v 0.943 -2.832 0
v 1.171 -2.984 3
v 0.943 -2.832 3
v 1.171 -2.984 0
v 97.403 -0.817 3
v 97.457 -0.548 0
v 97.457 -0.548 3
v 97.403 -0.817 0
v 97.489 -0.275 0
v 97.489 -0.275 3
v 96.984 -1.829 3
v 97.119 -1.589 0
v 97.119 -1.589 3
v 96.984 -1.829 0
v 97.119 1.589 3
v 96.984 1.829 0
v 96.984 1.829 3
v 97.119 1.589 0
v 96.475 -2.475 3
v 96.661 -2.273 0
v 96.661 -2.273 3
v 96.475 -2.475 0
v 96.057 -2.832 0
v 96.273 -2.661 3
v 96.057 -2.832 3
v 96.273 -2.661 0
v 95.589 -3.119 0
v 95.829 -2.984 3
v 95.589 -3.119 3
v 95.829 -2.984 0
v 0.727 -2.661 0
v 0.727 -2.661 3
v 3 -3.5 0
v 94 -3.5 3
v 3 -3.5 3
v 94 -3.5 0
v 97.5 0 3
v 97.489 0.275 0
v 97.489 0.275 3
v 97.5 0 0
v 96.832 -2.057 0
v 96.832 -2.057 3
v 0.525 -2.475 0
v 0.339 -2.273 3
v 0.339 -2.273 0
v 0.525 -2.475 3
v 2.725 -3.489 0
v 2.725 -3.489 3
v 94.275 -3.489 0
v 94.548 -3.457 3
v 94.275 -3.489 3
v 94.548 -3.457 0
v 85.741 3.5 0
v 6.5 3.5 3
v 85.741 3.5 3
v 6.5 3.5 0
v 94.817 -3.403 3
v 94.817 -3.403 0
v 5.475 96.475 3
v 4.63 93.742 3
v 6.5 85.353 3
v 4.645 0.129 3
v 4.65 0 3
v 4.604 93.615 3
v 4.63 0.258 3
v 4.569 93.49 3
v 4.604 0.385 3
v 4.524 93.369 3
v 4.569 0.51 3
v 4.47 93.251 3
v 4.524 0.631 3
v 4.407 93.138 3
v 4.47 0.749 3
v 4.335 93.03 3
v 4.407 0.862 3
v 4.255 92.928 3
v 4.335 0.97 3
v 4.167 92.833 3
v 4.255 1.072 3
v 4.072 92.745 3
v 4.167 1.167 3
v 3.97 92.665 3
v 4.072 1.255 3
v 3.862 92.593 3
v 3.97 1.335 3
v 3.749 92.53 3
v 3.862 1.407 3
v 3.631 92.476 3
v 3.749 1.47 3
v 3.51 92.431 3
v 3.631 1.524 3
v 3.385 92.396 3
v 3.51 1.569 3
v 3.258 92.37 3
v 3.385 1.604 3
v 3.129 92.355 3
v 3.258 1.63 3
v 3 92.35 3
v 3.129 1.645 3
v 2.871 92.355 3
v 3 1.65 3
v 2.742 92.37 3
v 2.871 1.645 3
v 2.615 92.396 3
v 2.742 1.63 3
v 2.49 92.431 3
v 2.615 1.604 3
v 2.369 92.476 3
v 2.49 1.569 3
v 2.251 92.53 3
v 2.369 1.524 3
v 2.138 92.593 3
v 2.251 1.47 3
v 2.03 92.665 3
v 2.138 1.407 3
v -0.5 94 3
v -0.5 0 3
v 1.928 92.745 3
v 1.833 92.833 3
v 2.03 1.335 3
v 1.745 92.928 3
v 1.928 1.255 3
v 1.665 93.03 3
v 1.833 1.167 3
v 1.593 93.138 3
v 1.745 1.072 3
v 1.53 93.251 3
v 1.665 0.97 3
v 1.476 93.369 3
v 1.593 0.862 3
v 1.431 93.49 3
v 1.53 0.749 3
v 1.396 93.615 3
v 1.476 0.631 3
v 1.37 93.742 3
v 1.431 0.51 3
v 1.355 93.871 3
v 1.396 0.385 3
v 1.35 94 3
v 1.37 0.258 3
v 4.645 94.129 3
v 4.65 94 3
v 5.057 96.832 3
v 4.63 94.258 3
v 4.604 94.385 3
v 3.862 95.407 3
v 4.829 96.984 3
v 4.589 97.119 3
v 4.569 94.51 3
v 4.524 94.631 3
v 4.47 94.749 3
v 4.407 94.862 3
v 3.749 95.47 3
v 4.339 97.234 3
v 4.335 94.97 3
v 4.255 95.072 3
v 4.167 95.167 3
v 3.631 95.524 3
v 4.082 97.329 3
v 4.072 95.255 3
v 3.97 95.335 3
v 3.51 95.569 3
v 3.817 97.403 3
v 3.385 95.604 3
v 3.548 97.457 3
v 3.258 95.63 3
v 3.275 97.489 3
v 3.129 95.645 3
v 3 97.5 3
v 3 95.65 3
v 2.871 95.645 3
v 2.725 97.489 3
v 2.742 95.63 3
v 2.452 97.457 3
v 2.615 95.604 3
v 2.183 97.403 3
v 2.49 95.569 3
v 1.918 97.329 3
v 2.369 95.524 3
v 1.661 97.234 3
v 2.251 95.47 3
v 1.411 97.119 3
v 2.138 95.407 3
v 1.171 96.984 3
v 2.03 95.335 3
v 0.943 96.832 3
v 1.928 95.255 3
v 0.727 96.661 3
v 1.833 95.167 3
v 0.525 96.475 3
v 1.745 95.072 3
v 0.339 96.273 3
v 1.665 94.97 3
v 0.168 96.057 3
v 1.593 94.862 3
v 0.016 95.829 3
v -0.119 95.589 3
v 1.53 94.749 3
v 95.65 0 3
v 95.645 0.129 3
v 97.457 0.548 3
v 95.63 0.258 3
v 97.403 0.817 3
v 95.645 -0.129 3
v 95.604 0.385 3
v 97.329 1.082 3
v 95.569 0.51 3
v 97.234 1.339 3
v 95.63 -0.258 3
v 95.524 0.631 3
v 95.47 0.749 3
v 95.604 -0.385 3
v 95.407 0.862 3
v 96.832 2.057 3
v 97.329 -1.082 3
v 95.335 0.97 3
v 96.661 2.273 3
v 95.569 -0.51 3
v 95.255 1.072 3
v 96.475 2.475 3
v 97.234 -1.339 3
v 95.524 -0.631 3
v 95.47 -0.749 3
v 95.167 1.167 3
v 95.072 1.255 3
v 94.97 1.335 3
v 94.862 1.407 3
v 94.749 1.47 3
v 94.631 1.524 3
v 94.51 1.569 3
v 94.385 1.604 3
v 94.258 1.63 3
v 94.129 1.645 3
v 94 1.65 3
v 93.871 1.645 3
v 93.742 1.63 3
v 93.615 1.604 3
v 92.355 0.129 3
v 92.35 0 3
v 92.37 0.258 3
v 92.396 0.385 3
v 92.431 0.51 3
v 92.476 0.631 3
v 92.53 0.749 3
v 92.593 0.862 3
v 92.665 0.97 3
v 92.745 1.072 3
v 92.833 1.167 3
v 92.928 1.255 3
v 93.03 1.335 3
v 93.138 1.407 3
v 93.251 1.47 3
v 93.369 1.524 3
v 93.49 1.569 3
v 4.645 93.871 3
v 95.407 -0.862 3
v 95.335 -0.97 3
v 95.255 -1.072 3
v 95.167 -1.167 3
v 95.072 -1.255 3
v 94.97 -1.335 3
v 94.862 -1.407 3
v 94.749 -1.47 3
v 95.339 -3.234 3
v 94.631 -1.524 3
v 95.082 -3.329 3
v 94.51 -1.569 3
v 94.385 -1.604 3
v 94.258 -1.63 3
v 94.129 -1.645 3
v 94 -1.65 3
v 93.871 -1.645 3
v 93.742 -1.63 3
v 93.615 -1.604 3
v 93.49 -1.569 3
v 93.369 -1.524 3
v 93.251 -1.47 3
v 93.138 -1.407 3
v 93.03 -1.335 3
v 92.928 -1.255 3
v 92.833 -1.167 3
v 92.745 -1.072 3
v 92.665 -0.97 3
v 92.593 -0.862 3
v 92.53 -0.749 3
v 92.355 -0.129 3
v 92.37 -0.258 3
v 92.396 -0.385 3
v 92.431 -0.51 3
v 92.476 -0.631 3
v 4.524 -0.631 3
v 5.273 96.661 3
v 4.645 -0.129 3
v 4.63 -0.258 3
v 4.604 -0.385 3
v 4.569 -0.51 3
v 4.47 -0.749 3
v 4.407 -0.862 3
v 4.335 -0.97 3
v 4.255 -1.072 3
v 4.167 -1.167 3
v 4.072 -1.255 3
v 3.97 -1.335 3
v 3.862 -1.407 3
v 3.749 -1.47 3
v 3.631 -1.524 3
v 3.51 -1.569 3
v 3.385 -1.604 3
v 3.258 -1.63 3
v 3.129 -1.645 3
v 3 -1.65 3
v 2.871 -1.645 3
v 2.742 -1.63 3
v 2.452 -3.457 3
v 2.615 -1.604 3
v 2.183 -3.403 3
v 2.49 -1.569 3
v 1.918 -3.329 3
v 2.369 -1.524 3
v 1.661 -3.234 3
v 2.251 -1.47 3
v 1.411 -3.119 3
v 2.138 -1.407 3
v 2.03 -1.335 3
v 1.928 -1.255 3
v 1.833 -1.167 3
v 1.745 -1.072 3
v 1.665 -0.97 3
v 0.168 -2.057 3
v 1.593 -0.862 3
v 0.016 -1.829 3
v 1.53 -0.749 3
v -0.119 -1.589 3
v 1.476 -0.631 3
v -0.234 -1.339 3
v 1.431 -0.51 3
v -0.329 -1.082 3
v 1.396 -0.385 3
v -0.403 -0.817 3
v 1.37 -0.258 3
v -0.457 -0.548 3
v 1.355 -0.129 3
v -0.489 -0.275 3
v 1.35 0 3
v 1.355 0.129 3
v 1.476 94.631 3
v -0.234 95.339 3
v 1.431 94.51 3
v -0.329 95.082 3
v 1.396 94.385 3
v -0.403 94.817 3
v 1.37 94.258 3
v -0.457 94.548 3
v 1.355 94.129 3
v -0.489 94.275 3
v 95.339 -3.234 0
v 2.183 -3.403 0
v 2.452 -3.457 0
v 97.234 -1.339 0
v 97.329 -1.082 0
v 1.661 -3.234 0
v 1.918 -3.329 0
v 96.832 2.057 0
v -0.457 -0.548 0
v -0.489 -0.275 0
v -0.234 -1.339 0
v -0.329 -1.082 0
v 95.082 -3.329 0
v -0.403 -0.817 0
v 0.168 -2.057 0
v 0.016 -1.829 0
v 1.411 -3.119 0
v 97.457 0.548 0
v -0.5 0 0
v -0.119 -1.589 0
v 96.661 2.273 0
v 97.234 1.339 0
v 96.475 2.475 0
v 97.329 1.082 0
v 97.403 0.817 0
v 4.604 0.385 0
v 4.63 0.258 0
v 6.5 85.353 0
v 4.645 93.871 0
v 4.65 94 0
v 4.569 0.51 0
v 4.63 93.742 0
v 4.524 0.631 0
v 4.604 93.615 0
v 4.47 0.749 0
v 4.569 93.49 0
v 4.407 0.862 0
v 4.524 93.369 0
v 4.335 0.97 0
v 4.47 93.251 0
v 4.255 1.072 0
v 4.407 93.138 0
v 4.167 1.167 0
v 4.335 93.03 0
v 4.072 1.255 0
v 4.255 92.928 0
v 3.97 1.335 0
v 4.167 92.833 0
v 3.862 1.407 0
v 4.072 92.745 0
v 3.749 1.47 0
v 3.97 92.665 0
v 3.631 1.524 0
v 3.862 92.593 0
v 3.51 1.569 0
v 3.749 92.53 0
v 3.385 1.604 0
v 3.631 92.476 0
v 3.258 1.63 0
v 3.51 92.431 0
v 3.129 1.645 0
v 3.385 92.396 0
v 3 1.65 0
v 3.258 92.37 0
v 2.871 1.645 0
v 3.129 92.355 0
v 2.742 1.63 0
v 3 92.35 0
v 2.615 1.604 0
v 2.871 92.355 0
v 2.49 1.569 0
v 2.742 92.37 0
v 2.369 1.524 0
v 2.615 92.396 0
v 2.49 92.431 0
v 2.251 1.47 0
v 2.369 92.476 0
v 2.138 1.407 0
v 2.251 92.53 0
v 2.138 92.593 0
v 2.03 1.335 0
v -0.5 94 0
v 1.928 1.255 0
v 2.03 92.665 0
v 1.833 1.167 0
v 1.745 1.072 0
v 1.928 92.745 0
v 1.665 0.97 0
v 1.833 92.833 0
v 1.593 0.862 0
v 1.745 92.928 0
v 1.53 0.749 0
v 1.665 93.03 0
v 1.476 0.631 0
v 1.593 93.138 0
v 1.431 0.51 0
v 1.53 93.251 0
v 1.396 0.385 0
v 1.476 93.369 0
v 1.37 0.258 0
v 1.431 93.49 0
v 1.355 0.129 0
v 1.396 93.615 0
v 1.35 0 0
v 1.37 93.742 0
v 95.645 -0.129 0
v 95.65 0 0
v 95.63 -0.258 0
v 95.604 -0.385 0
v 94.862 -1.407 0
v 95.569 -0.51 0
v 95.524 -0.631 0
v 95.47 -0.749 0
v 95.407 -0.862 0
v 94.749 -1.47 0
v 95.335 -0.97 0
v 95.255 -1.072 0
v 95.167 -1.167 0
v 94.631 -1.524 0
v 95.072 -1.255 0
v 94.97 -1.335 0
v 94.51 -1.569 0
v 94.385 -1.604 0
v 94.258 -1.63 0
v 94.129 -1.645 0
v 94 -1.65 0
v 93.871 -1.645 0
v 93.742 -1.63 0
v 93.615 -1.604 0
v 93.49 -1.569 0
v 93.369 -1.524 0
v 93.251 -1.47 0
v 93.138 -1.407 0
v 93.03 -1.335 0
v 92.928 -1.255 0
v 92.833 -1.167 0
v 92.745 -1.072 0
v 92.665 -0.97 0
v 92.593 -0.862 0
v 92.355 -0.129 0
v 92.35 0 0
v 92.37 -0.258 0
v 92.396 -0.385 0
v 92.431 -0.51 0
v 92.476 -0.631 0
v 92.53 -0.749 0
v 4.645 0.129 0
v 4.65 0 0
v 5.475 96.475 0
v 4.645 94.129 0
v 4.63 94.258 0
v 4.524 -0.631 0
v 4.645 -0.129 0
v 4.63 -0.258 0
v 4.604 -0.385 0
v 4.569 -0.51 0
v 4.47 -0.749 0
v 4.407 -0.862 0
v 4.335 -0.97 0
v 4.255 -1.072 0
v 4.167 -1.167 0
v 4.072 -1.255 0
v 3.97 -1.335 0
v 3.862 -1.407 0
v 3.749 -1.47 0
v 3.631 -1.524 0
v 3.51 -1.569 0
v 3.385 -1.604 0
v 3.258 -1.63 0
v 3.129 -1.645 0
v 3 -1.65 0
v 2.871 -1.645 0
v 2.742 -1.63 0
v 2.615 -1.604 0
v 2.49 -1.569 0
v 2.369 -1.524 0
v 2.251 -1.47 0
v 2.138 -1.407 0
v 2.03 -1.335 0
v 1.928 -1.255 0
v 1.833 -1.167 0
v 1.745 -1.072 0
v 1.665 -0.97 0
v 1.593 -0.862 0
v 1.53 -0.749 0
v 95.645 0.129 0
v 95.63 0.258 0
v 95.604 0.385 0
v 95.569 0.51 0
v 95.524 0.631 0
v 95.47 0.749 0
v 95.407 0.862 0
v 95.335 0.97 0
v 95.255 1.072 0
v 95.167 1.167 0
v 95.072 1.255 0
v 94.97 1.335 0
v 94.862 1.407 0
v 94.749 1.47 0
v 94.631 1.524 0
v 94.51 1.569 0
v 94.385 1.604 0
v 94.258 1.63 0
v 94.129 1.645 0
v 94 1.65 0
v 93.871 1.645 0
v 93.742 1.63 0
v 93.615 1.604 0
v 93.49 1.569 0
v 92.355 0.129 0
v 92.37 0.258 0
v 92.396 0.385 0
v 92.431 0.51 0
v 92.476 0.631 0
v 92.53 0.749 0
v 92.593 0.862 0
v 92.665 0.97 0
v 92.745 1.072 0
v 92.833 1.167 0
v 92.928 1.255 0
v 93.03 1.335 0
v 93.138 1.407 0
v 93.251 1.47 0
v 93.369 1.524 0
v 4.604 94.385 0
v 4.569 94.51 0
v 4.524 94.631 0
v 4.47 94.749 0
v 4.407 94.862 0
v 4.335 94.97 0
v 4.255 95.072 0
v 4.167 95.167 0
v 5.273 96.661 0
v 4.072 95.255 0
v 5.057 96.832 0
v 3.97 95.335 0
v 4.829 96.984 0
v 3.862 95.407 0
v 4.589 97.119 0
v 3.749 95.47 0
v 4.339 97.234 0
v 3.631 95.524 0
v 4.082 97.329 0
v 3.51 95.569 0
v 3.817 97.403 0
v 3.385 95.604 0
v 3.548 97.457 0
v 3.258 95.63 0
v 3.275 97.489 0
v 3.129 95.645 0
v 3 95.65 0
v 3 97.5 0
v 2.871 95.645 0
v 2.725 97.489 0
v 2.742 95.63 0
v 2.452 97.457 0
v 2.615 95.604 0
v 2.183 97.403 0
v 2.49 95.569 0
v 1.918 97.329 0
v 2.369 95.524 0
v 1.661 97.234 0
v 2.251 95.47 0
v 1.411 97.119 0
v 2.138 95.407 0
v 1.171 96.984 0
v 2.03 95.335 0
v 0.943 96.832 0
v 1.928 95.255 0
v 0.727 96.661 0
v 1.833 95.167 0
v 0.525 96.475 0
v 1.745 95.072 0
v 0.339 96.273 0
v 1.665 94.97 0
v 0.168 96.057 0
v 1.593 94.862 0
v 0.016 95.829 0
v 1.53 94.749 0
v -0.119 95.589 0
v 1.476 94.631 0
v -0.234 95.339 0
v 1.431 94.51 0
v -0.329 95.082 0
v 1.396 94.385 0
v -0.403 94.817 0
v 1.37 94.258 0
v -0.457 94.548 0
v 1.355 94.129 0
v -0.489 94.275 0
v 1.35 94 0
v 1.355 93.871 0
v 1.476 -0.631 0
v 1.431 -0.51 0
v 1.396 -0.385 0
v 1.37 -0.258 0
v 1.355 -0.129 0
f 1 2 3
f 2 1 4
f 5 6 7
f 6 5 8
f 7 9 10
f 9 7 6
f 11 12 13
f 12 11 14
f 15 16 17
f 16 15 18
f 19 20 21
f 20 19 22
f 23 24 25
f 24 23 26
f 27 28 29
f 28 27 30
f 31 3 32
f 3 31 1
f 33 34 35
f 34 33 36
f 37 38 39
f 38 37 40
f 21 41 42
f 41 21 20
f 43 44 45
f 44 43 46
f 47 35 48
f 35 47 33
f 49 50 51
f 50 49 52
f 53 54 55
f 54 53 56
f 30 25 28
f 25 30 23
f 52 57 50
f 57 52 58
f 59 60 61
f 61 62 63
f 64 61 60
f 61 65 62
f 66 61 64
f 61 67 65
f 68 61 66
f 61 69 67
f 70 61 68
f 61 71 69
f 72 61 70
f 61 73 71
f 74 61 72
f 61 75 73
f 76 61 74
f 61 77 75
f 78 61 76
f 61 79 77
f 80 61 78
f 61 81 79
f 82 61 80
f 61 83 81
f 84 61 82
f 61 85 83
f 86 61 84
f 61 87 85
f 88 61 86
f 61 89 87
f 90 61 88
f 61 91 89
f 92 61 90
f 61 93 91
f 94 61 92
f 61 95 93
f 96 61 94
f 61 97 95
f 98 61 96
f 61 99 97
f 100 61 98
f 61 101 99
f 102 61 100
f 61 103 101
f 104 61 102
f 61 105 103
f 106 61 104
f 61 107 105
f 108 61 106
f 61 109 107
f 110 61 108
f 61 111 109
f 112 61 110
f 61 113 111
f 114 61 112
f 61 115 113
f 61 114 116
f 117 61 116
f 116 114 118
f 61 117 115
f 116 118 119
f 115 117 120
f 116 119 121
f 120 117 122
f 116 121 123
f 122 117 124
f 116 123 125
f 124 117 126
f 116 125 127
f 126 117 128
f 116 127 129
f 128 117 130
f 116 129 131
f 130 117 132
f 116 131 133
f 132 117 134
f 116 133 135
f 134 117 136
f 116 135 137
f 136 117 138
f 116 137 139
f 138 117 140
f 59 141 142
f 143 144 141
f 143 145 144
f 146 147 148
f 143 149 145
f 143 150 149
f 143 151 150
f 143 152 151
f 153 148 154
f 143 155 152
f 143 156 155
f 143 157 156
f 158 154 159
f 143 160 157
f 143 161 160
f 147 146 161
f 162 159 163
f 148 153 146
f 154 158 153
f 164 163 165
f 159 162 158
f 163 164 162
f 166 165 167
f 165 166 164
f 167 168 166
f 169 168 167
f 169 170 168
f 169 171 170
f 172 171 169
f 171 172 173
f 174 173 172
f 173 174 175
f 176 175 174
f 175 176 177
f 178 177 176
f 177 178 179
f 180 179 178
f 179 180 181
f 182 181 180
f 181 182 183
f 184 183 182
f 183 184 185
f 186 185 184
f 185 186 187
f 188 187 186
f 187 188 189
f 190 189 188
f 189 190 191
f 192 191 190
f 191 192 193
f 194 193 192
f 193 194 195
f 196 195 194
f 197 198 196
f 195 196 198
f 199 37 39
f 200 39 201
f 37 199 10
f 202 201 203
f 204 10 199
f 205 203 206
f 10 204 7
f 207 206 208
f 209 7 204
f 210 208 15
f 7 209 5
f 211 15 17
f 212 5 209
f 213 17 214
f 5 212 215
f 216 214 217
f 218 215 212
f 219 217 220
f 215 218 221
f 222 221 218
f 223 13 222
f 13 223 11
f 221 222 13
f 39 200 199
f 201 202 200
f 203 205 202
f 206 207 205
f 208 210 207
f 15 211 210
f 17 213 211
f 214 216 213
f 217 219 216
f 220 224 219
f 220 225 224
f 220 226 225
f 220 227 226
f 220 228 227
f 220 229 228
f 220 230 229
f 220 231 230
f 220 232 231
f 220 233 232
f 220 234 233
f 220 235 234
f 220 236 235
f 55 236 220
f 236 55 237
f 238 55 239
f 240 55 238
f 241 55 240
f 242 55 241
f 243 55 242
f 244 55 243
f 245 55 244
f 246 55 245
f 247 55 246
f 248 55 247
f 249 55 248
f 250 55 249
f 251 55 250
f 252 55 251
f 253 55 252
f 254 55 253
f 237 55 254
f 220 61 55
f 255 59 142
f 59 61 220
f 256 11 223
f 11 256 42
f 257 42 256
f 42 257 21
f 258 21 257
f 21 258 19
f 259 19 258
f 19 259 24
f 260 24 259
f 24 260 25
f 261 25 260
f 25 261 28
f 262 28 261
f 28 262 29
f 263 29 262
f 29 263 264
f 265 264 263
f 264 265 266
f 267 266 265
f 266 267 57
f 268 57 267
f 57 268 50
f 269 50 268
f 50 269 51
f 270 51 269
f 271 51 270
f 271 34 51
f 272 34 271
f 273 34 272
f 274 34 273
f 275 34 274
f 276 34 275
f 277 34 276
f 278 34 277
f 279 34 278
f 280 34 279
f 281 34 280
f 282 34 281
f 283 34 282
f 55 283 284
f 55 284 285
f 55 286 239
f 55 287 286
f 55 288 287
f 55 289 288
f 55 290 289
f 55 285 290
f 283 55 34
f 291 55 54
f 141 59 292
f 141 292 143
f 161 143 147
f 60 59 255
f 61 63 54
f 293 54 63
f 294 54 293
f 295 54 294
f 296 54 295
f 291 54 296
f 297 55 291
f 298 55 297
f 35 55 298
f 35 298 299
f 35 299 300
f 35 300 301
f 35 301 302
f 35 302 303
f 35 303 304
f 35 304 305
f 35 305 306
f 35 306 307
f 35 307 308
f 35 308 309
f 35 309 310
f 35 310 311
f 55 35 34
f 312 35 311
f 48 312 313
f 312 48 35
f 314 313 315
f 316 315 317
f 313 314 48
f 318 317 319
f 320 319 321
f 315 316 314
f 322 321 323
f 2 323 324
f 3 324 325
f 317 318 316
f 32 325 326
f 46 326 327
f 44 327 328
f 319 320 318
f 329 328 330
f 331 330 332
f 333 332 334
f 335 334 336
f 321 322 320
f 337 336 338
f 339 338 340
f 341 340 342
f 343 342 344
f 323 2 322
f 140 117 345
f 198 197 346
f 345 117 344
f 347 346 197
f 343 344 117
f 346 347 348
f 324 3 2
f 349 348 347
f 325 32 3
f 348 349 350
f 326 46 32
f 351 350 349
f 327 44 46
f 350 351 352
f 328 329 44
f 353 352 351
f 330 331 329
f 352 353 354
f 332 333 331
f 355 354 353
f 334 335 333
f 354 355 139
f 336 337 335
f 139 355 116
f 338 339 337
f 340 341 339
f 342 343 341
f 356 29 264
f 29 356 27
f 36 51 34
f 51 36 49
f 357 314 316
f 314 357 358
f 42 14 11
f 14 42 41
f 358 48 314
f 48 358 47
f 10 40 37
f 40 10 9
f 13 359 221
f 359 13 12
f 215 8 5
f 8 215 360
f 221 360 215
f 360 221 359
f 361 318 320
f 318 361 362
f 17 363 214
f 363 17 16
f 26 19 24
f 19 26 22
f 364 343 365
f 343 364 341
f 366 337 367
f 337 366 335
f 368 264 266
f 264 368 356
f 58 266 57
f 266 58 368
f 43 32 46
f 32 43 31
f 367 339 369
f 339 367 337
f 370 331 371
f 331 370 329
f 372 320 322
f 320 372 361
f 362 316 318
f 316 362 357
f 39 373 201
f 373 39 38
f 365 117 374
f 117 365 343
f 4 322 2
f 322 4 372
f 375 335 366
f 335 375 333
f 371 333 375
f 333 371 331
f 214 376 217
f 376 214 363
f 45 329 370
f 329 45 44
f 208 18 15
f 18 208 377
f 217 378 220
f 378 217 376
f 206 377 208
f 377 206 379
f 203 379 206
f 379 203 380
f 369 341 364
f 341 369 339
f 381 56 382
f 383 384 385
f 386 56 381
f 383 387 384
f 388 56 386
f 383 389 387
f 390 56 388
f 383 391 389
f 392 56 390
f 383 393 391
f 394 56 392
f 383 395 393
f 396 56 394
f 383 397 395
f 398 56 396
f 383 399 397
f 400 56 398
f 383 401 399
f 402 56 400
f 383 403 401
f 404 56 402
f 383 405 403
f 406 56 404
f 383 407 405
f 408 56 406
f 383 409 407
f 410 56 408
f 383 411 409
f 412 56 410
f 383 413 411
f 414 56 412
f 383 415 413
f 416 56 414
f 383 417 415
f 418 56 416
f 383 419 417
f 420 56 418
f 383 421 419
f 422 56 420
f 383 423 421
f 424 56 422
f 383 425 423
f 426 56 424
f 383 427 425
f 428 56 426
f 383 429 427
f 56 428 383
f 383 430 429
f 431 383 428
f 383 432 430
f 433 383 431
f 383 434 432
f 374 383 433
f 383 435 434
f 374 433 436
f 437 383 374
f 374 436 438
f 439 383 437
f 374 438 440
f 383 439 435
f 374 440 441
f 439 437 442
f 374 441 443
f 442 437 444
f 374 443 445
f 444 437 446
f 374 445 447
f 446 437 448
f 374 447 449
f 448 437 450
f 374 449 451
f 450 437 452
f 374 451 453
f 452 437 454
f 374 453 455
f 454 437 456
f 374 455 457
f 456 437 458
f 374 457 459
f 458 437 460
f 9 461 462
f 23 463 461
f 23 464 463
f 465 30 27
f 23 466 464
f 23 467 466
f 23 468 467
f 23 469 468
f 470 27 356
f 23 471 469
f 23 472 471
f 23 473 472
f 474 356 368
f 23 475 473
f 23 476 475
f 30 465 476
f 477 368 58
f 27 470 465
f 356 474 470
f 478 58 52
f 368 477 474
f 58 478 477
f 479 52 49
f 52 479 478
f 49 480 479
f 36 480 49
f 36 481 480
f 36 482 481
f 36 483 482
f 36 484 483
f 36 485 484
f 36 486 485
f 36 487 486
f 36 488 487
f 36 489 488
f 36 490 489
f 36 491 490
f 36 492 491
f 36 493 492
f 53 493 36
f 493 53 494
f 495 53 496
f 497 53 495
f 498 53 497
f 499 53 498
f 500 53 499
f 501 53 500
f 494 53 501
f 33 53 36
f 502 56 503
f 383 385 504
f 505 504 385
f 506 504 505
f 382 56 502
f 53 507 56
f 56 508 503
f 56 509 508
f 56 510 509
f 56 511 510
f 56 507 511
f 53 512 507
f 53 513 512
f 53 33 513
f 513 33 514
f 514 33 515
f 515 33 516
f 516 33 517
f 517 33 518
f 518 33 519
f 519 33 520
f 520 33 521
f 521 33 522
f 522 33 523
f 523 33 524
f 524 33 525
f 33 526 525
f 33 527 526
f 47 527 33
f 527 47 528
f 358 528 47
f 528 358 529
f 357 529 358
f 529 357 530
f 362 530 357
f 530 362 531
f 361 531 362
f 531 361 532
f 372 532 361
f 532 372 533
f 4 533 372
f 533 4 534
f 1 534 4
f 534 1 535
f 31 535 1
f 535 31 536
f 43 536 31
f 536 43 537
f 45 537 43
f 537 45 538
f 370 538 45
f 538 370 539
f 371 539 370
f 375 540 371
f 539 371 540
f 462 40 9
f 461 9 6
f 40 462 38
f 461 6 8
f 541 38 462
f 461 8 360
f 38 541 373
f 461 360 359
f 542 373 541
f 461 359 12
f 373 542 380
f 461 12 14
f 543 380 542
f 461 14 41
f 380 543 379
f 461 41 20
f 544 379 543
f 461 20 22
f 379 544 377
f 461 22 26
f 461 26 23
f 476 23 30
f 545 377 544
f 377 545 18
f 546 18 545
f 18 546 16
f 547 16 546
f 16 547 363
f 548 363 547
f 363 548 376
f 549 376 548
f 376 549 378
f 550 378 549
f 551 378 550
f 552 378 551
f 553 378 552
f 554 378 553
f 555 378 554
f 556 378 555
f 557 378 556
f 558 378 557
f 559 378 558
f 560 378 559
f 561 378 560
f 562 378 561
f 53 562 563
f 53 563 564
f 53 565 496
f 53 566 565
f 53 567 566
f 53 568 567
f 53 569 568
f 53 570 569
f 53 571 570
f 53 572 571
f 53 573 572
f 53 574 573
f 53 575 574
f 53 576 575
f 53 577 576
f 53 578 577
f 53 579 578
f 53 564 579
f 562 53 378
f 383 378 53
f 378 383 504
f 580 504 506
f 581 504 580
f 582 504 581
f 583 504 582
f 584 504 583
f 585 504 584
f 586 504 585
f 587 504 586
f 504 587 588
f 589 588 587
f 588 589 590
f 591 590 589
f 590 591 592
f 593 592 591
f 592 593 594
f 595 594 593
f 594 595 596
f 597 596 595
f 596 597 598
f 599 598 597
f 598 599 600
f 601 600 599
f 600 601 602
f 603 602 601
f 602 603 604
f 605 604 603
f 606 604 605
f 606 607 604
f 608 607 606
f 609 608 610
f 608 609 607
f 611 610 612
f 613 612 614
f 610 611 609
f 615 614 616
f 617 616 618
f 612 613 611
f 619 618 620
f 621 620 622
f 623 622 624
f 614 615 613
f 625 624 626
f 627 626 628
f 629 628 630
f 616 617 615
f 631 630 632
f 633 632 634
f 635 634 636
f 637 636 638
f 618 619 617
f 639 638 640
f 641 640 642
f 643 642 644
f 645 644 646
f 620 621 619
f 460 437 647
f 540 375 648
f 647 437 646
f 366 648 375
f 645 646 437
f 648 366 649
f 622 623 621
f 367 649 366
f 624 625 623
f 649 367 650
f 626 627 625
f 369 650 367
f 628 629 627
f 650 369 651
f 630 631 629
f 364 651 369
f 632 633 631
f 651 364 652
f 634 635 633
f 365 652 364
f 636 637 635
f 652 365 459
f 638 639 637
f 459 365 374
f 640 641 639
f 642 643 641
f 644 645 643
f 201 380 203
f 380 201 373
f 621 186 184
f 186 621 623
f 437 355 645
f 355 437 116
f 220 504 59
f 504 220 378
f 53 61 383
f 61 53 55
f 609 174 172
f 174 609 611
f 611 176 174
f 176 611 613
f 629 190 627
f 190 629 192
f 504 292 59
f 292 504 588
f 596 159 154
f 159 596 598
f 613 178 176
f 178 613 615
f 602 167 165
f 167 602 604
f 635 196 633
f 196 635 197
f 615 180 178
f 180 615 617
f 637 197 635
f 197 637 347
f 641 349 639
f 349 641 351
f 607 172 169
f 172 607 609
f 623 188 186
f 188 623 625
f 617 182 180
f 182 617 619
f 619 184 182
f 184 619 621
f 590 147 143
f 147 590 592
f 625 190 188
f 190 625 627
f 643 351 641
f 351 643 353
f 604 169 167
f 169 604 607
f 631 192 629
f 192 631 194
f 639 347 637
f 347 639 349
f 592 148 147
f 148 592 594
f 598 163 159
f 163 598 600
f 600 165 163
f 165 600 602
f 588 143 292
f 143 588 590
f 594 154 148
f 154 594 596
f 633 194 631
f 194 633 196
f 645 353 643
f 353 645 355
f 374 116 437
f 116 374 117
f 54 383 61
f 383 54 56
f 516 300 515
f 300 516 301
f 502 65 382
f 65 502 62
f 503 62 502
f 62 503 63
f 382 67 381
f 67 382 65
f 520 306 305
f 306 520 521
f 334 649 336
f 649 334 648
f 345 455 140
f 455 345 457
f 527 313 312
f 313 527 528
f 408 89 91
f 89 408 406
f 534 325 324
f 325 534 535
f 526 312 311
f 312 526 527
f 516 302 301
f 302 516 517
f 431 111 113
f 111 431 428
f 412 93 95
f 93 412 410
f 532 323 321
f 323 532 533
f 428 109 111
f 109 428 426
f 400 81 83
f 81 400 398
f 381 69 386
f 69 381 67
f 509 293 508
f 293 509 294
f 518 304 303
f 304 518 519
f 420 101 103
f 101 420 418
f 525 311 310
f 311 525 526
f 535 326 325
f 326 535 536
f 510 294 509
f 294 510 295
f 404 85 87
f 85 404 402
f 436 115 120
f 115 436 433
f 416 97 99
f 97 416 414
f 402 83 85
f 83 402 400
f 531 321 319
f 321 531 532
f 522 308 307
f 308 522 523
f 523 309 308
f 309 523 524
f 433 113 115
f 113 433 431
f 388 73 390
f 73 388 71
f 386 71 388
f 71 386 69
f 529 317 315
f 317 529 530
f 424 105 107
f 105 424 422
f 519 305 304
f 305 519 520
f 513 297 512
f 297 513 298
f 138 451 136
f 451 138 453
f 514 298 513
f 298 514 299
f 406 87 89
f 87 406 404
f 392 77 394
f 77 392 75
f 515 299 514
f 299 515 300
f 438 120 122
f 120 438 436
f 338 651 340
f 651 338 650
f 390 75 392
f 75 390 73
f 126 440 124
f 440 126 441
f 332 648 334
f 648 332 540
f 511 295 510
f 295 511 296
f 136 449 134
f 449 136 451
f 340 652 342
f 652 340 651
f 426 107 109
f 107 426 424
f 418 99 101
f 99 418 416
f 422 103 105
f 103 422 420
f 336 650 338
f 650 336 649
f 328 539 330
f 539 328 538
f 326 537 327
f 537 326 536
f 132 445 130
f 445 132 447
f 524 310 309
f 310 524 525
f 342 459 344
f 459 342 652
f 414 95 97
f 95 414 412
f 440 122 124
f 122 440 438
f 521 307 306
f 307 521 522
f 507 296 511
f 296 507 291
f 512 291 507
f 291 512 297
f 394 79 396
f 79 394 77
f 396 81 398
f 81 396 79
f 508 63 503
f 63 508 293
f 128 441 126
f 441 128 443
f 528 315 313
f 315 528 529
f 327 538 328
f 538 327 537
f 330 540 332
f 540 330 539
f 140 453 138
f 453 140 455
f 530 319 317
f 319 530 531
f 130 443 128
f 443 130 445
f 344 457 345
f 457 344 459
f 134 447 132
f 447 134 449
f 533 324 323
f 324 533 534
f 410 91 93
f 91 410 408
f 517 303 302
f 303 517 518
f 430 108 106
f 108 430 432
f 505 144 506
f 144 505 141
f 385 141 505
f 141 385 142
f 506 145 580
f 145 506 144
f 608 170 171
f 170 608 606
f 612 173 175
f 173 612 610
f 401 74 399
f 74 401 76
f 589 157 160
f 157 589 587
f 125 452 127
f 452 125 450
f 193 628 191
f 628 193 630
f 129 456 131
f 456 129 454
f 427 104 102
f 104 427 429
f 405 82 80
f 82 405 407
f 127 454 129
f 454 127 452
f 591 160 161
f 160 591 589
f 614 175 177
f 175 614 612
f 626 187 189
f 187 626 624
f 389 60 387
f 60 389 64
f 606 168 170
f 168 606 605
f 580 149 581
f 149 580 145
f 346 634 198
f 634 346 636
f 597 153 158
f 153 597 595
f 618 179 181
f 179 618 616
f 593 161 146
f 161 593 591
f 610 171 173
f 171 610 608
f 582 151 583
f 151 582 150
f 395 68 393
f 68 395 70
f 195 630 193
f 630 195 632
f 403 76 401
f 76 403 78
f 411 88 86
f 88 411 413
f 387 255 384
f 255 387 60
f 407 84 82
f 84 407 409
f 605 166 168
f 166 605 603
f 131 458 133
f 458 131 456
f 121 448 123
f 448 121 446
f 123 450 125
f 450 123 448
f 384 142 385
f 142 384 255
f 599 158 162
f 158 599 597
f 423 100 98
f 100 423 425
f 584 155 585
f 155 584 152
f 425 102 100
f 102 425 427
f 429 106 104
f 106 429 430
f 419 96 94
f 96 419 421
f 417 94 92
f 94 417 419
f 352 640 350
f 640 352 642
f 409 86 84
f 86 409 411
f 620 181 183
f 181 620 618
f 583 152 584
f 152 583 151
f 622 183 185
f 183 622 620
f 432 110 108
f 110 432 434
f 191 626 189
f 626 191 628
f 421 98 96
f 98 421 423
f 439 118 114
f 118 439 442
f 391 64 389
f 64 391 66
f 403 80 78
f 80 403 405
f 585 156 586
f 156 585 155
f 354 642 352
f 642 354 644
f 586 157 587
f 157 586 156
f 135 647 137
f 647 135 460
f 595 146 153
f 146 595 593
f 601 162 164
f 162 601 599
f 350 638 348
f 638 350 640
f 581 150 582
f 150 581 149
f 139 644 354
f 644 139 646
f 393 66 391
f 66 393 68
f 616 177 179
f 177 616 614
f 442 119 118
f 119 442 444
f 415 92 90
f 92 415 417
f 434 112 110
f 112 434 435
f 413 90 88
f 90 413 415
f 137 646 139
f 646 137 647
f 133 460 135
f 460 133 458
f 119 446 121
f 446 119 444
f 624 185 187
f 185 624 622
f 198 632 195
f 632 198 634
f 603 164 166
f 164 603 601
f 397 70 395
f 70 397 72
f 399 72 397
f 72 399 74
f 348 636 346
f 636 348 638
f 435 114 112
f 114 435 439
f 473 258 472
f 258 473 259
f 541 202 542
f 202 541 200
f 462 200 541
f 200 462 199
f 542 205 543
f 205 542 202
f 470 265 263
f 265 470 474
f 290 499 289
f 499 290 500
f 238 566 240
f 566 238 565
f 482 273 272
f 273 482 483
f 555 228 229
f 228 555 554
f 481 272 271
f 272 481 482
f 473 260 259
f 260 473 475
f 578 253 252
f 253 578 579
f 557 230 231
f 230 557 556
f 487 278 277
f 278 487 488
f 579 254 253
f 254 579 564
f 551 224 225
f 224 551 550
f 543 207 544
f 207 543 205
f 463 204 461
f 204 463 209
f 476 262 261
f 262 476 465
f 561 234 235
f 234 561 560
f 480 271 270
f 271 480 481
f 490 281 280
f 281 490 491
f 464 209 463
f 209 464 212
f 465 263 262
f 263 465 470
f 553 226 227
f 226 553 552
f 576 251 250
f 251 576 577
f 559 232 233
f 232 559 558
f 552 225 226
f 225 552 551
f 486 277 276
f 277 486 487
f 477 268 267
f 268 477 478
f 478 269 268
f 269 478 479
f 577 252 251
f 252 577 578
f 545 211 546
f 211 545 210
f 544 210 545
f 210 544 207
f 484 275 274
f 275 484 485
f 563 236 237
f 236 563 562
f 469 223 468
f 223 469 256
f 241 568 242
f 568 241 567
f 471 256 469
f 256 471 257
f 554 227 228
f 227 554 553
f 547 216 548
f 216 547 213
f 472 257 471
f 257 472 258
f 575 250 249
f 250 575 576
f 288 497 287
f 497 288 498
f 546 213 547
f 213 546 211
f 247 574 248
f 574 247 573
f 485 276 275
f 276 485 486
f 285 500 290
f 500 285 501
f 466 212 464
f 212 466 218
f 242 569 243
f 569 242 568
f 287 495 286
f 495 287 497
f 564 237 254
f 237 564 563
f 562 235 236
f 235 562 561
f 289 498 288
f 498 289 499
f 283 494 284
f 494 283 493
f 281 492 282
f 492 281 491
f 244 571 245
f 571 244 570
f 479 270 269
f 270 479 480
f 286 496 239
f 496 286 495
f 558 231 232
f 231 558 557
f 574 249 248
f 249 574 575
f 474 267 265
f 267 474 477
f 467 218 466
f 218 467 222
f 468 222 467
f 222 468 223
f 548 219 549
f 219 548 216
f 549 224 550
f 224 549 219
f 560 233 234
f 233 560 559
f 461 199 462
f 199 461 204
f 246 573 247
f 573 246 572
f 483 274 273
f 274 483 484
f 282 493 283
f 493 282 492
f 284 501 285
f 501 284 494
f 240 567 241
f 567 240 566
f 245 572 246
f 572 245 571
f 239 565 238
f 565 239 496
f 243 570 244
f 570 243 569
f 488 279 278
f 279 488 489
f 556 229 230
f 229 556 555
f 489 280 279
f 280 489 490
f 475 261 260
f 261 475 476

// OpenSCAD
$fn=80;
extra=0.02;

/* [Show Parts] */
// Show Top Clamps for fixing Solar Panels
showClamps = false;
// Show Main Frame Solar Panels
showFrame = false;
// Show Hinge
showHinge = false;
// Show AngleHinge
showAngleHinge = true;

/* [Solar Panel Parameter] */
// Solar Panel X Len [mm]
solPnlX = 80;
// Solar Panel Y Len [mm]
solPnlY = 45;
// Solar Panel Z Height [mm]
solPnlZ = 2;
// Solar Panel Clearance to Frame
solPnlClearance = 1.5;
// Move Solar Panel in Z
solPnlZMove = 0;
// Solar Panel count in X Direction
solPnlCntX = 2;
// Solar Panel count in Y Direction
solPnlCntY = 2;

/* [Screw Parameters] */
// Screw Diameter
screwDia = 3.2;
// Screw Length (or cutout depth of screws)
screwLen = 8;
// Move outer screws into the middle
sideScrewXMove = 3;

/* [Frame Parameters] */
// 1st Frame Width x Direction
mountFrame1X = 10;
// End Frame Witdth x Direction
mountFrame2X = 10;
// (all) Mid Frame Width x Direction
mountFrameMid = 8;
// 1st Frame Width y Direction
mountFrame1Y = 3;
// 1st Frame Width y Direction
mountFrame2Y = 3;
// Frame Heigth (z Direction)
mountFrameZ = 5;


/* [Solar Panels Clamp Parameters] */
// Clamp Length (y Direction)
clampYLen = 60;
// Clamp Height (z Direction)
clampZLen = 1;
// Additional Y Move
clampYMove = 8;
// Screw Hole x Move
clampScrewXMove = 5;
// Screw Hole y Move
clampScrewYMove = 0;
// Clamp Fixture Y Move
clampFixtureYMove = 10;
// Clamp Fixture Pin Dia
clampFixturePinDia = 4;
// Clamp Fixture Pin Z Len
clampFixturePinZ = 4;
// Clamp Fixtur Key Length X
clampFixtureKeyX = 5;
// Clamp Fixtur Key Length Y
clampFixtureKeyY = 2;

/* [Hinge Plate Parameters] */
// Hinge Plate Width (x Direction)
hingePlateX = 20;
// Hinge Plate Length (y Direction)
hingePlateY = 110;
// Hinge Plate Thickness (z Direction)
hingePlateZ = mountFrameZ + 3;
// Cutout to Frame
hingeToFrameCutout = 10;
// Clearance for cutout
hingeFrameClearance = 1;
// additional x move
hingePlateMoveX = 0;
// additional y move
hingePlateMoveY = 0;
// hingeMountHoles enable/disable
hingeMountHoles = true;
// Hinge Mount Screw distance
hingeMountScrewDistance = 80;
// Hinge Mount Screw X Move
hingeMountScrewXMove = 0;
// Hinge Mount Screw Y Move
hingeMountScrewYMove = 0;
// Hinge Mount Screw Dia
hingeMountScrewDia = 3.3;


/* [Other Parameters] */
tempX = mountFrame1X + ((solPnlX)*solPnlCntX) + (mountFrameMid * (solPnlCntX-1)) +  mountFrame2X;
tempY = mountFrame1Y + (solPnlY)*solPnlCntY + mountFrame2Y;
tempCutX = solPnlX - solPnlClearance*2;
tempCutY = (solPnlY*solPnlCntY) + extra;

clampYLenTemp = tempY - screwLen*2;


sideScrewDistance = function (x)
(mountFrame1X + x*(solPnlX + mountFrameMid) - mountFrameMid/2);


if(showAngleHinge)
{
  angleHinge();
}

if(showHinge)
{
  hingePlate();
}

anglePlateWidth = 7;
anglePlateZ = 3;

module angleHinge()
{
  difference()
  {
    union()
    {
      hull()
      {
        translate([sideScrewXMove,0,0])
        cylinder(d=anglePlateWidth, h=anglePlateZ);
        translate([sideScrewDistance(1),0,0])
        cylinder(d=anglePlateWidth, h=anglePlateZ);
      }
      hull()
      {
        translate([sideScrewXMove,sideScrewDistance(1),0])
        cylinder(d=anglePlateWidth, h=anglePlateZ);
        translate([sideScrewDistance(1),0,0])
        cylinder(d=anglePlateWidth, h=anglePlateZ);
      }
      hull()
      {
        translate([sideScrewXMove,sideScrewDistance(1),0])
        cylinder(d=anglePlateWidth, h=anglePlateZ);
        translate([sideScrewXMove,0,0])
        cylinder(d=anglePlateWidth, h=anglePlateZ);
      }
    }

    translate([sideScrewXMove,0,-extra])
    cylinder(d=hingeMountScrewDia, h=anglePlateZ+extra*2);
    translate([sideScrewXMove,sideScrewDistance(1),-extra])
    cylinder(d=hingeMountScrewDia, h=anglePlateZ+extra*2);
    translate([sideScrewDistance(1),0,-extra])
    cylinder(d=hingeMountScrewDia, h=anglePlateZ+extra*2);
  }

}

module hingePlate()
{
  tempYMove = (hingePlateY - tempY)/2;
  tempZMove = (mountFrameZ - hingePlateZ);

  difference()
  {
    translate([-hingeToFrameCutout-hingeFrameClearance,-tempYMove,tempZMove])
    cube([hingePlateX,hingePlateY,hingePlateZ]);

    translate([-hingeFrameClearance,-hingeFrameClearance,tempZMove-extra])
    cube([hingeToFrameCutout+extra,hingePlateY-tempYMove*2+hingeFrameClearance*2,hingePlateZ+extra*2]);

    translate([0,0,tempZMove+hingePlateZ/2])
    union()
    {
      translate([sideScrewXMove,
        hingePlateY-tempYMove-screwLen+extra, 0])
      rotate([-90,0,0])
      cylinder(d=screwDia+0.5,h=screwLen+extra*2);
      translate([sideScrewXMove,
        hingeFrameClearance-hingeToFrameCutout, 0])
      rotate([-90,0,0])
      cylinder(d=screwDia+0.5,h=screwLen+extra*2);
    }

    if(hingeMountHoles)
    {
      // hinge mount screw holes
      translate([hingeMountScrewXMove,hingePlateY/2-tempYMove+hingeMountScrewYMove,0])
      {
        translate([-hingeFrameClearance-hingeToFrameCutout/2,
          -hingeMountScrewDistance/2,
          tempZMove+hingePlateZ/2-extra/2])
        cylinder(d=hingeMountScrewDia, h=hingePlateZ+extra*2, center=true);
        translate([-hingeFrameClearance-hingeToFrameCutout/2,
          hingeMountScrewDistance/2,
          tempZMove+hingePlateZ/2-extra/2])
        cylinder(d=hingeMountScrewDia, h=hingePlateZ+extra*2, center=true);
      }
    }
  }
}

module clampPlate(xLen=10, yLen=20, zLen=1, screwXPos=0,fixture=true,
  fixtureDia=4, fixtureZ=4, cutoutExtra=0)
{
  difference()
  {
    cube([xLen+cutoutExtra,yLen,zLen]);
    translate([screwXPos,yLen/2-extra,-extra])
    cylinder(d=screwDia,h=screwLen+extra*2);
  }
  if(fixture==true)
  {
    translate([xLen/2,clampFixtureYMove,-fixtureZ])
    clampPin(pinDia=fixtureDia+cutoutExtra, pinL=fixtureZ,
      lx=clampFixtureKeyX+cutoutExtra,ly=clampFixtureKeyY+cutoutExtra,rot=90);
    translate([xLen/2,yLen-clampFixtureYMove,-fixtureZ])
    clampPin(pinDia=fixtureDia+cutoutExtra, pinL=fixtureZ,
      lx=clampFixtureKeyX+cutoutExtra,ly=clampFixtureKeyY+cutoutExtra,rot=-90);
  }
}

if(showClamps == true)
{
  translate([0,clampYMove,mountFrameZ])
  clampPlate(xLen=mountFrame1X+solPnlClearance, yLen=clampYLenTemp, zLen=clampZLen,
    screwXPos=clampScrewXMove,fixture=true,
    fixtureDia=clampFixturePinDia, fixtureZ=clampFixturePinZ);

  translate([tempX,clampYMove+clampYLenTemp,mountFrameZ])
  rotate([0,0,180])
  clampPlate(xLen=mountFrame1X+solPnlClearance, yLen=clampYLenTemp, zLen=clampZLen,
    screwXPos=clampScrewXMove,fixture=true,
    fixtureDia=clampFixturePinDia, fixtureZ=clampFixturePinZ);

  if(solPnlCntX > 1)
  {
    for (j=[1:solPnlCntX-1]) {
      tempClampPlateMove = mountFrame1X/2-solPnlClearance/2 + j*(solPnlX + mountFrameMid)
        - mountFrameMid/2;

      translate([tempClampPlateMove,clampYMove,mountFrameZ+extra])
      clampPlate(xLen=mountFrame1X+solPnlClearance, yLen=clampYLenTemp, zLen=clampZLen,
        screwXPos=(mountFrame1X+solPnlClearance)/2, fixture=true,
        fixtureDia=clampFixturePinDia,
        fixtureZ=clampFixturePinZ);
    }
  }
}

/* clampPin(pinDia=4, pinL=4, lx=5,ly=2,rot=90); */
module clampPin(pinDia=4, pinL=4, lx=5,ly=2, rot=0)
{
  rotate([0,0,rot])
  union()
  {
    cylinder(d=pinDia, h=pinL);
    translate([0,-ly/2,0])
    cube([pinDia+lx,ly,pinL]);
  }
}

/* solPnl(); */
module solPnl(yLen=40)
{
  translate([0,0,solPnlClearance/2])
  rotate([-90,0,0])
  hull()
  {
    translate([solPnlClearance,0,0])
      cylinder(r=solPnlClearance, h=yLen);
    translate([solPnlX-solPnlClearance,0,0])
      cylinder(r=solPnlClearance, h=yLen);
  }
}

module solPnlCutout(yLen=40)
{
  cube([solPnlX,yLen,mountFrameZ]);
}


if(showFrame == true)
{
  parametricMount();
}

module parametricMount()
{
  difference()
  {
    cube([tempX,tempY,mountFrameZ]);

    for (i=[0:solPnlCntX-1]) {
      tempMoveX=mountFrame1X + i*(solPnlX + mountFrameMid);
      translate([tempMoveX+solPnlClearance,mountFrame1Y,-extra])
      cube([tempCutX,tempCutY,mountFrameZ+extra*2]);

      translate([tempMoveX,mountFrame1Y,solPnlZMove-solPnlZ])
      translate([0,0,mountFrameZ])
      solPnlCutout(yLen=(solPnlY*solPnlCntY)+extra);
    }

    translate([sideScrewXMove,tempY-screwLen,mountFrameZ/2])
    rotate([-90,0,0])
    cylinder(d=screwDia,h=screwLen+extra*2);

    translate([sideScrewXMove,-extra,mountFrameZ/2])
    rotate([-90,0,0])
    cylinder(d=screwDia,h=screwLen+extra*2);

    translate([clampScrewXMove,tempY/2-extra,-extra])
    rotate([0,0,0])
    cylinder(d=screwDia,h=screwLen+extra*2);

    translate([0,clampYMove,mountFrameZ+extra])
    clampPlate(xLen=mountFrame1X+solPnlClearance,
      yLen=clampYLenTemp, zLen=clampZLen, screwXPos=clampScrewXMove,
      fixture=true, fixtureDia=clampFixturePinDia, fixtureZ=screwLen, cutoutExtra=0.5);


    if(solPnlCntX > 1)
    {
      for (i=[1:solPnlCntX-1]) {
        tempScrewMove = sideScrewDistance(i);

        translate([tempScrewMove,tempY-screwLen,mountFrameZ/2])
        rotate([-90,0,0])
        cylinder(d=screwDia,h=screwLen+extra*2);

        translate([tempScrewMove,-extra,mountFrameZ/2])
        rotate([-90,0,0])
        cylinder(d=screwDia,h=screwLen+extra*2);

        translate([tempScrewMove,tempY/2-extra,-extra])
        rotate([0,0,0])
        cylinder(d=screwDia,h=screwLen+extra*2);

        // pin cutout for clampPlate (tempX-mountFrame1X-solPnlClearance)/2  tempScrewMove
        translate([tempScrewMove-(solPnlClearance+mountFrame1X)/2,clampYMove,mountFrameZ+extra])
        clampPlate(xLen=mountFrame1X+solPnlClearance, yLen=clampYLenTemp, zLen=clampZLen,
          screwXPos=(mountFrame1X+solPnlClearance)/2, fixture=true,
          fixtureDia=clampFixturePinDia,
          fixtureZ=screwLen, cutoutExtra=0.5);
      }
    }


    translate([tempX-sideScrewXMove,tempY-screwLen,mountFrameZ/2])
    rotate([-90,0,0])
    cylinder(d=screwDia,h=screwLen+extra*2);
    translate([tempX-sideScrewXMove,-extra,mountFrameZ/2])
    rotate([-90,0,0])
    cylinder(d=screwDia,h=screwLen+extra*2);

    // pin cutout for clampPlate
    translate([tempX-clampScrewXMove,tempY/2-extra,-extra])
    rotate([0,0,0])
    cylinder(d=screwDia,h=screwLen+extra*2);

    // pin cutout for clampPlate
    translate([tempX-mountFrame2X-solPnlClearance,clampYMove,mountFrameZ+extra])
    clampPlate(xLen=mountFrame2X+solPnlClearance, yLen=clampYLenTemp, zLen=clampZLen,
      screwXPos=-clampScrewXMove,
      fixture=true, fixtureDia=clampFixturePinDia, fixtureZ=screwLen, cutoutExtra=0.5);
  }
}
